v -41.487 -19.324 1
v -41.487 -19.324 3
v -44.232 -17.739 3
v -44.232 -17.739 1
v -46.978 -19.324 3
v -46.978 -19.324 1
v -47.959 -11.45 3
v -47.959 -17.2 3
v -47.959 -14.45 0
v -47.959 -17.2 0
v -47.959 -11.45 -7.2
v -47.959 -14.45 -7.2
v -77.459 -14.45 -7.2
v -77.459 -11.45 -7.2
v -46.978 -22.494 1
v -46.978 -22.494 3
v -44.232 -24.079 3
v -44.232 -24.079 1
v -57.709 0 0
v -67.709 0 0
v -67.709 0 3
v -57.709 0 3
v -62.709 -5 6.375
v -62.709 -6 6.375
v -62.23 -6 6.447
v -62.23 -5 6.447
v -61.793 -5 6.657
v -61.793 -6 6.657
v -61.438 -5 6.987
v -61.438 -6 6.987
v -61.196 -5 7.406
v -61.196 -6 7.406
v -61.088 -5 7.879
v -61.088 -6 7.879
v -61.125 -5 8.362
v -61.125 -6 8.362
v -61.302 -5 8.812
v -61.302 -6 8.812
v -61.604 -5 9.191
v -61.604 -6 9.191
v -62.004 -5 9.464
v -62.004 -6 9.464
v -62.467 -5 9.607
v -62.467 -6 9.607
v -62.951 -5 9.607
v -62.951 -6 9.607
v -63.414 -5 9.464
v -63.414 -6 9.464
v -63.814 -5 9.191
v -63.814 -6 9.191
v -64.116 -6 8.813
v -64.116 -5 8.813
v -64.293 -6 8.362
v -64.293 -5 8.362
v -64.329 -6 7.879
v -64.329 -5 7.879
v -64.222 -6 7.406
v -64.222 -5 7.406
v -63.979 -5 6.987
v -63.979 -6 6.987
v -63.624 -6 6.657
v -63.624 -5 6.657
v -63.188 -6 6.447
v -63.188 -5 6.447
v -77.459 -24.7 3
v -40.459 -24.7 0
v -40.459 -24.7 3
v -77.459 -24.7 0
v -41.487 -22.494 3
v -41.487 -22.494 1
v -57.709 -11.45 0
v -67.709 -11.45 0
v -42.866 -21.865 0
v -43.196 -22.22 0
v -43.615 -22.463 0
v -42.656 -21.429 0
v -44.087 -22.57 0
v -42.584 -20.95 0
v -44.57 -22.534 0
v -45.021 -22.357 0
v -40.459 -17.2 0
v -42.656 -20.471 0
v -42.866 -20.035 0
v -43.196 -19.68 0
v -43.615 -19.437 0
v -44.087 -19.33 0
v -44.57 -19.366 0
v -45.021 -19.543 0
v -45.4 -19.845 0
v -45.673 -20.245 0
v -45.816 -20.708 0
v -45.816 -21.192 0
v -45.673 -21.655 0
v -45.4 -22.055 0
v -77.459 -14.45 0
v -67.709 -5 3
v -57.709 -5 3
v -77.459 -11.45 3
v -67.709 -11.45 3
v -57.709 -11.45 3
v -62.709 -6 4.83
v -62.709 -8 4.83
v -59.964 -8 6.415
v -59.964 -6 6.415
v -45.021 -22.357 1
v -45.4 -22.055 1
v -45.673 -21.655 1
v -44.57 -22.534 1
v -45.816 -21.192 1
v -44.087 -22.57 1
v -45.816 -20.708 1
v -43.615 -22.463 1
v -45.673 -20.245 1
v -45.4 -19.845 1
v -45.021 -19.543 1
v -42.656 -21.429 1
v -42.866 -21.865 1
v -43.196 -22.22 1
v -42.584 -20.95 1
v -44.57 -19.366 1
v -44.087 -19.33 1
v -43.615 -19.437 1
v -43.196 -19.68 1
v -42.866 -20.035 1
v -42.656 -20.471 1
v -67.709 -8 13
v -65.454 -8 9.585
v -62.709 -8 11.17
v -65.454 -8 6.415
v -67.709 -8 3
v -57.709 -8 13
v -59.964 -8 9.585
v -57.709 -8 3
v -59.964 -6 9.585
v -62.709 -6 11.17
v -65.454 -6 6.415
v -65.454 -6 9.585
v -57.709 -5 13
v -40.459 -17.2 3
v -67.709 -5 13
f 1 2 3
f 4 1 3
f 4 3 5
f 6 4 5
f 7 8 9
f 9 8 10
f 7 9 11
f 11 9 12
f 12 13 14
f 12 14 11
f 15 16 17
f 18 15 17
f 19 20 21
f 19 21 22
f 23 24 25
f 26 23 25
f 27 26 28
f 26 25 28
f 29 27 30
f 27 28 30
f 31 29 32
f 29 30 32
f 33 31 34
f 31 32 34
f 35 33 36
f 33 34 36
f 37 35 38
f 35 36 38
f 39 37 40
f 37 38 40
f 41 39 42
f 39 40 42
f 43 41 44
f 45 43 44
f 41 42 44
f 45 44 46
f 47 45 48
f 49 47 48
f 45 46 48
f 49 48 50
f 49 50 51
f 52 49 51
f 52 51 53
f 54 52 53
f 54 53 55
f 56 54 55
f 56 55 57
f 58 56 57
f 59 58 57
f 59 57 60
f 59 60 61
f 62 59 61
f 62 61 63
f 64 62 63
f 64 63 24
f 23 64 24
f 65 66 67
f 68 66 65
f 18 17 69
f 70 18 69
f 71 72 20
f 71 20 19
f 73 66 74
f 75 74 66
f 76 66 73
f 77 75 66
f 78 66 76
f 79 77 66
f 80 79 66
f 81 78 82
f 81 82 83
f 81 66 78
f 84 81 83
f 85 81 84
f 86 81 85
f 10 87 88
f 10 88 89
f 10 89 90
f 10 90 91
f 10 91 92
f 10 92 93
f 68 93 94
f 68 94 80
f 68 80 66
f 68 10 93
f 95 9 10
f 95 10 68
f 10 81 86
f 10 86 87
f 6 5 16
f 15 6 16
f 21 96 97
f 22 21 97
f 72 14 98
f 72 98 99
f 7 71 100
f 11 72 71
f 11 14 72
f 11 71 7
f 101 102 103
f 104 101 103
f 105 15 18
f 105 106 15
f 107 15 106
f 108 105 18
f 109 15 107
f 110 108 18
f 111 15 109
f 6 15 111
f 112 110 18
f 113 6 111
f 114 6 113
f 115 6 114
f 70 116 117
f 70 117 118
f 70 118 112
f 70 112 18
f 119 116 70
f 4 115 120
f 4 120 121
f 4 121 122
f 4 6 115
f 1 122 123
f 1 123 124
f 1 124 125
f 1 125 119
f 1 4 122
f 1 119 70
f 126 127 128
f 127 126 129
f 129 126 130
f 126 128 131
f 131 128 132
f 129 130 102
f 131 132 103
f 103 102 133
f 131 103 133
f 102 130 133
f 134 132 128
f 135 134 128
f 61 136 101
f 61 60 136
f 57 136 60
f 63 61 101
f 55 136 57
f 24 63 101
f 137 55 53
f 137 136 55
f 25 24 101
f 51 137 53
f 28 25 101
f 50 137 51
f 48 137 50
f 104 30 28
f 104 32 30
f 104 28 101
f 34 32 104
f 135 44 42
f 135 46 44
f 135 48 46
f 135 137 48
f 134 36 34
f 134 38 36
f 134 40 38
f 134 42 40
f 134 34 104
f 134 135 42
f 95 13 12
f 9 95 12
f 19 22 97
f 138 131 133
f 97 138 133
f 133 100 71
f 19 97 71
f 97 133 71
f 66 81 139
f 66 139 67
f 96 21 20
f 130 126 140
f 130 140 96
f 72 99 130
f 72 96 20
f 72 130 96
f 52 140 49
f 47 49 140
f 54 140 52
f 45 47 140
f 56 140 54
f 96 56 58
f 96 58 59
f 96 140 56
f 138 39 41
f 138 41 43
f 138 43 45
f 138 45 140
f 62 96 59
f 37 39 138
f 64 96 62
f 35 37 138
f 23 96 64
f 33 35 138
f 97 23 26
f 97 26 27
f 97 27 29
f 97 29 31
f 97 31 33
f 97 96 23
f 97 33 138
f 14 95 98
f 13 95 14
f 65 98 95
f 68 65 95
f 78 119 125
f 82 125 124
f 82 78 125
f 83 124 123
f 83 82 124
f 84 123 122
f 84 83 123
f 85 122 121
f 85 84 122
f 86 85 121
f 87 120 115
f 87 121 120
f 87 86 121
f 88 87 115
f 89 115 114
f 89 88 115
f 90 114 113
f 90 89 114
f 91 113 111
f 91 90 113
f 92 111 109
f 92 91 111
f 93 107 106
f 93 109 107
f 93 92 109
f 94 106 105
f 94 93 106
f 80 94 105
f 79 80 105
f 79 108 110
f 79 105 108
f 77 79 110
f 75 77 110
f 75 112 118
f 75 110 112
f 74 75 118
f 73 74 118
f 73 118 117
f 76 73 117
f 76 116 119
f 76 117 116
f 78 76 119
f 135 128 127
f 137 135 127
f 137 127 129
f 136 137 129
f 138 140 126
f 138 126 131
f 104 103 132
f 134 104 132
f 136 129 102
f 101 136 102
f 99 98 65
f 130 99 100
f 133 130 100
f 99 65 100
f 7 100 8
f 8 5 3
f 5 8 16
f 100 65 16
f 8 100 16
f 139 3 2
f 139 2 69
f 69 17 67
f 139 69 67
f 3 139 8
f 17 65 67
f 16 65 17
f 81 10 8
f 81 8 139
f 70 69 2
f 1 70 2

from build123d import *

# Parameters (mm, degrees)
CROQUIS1_R              = 1.625
SALIENTE_EXTRUIR1_DEPTH = 3
CORTAR_EXTRUIR1_DEPTH   = 2
CROQUIS4_W              = 29.5
CROQUIS4_H              = 10.2
SALIENTE_EXTRUIR2_DEPTH = 3
SALIENTE_EXTRUIR3_DEPTH = 3
CROQUIS7_W              = 10
CROQUIS7_H              = 3
SALIENTE_EXTRUIR4_DEPTH = 5
CROQUIS9_W              = 10
CROQUIS9_H              = 3
SALIENTE_EXTRUIR5_DEPTH = 10
CROQUIS10_R             = 1.625
CORTAR_EXTRUIR2_DEPTH   = 3
CORTAR_EXTRUIR3_DEPTH   = 2


with BuildPart() as part:
    # Croquis1 → Saliente-Extruir1 (new body)
    with BuildSketch(Plane.XY):
        Polygon((-40.458841365, -24.7), (-77.458841365, -24.7), (-77.458841365, -14.45), (-47.958841365, -14.45), (-47.958841365, -17.2), (-40.458841365, -17.2), align=None)
        with Locations((-44.208841365, -20.95)):
            Circle(CROQUIS1_R, mode=Mode.SUBTRACT)
    extrude(amount=SALIENTE_EXTRUIR1_DEPTH)

    # Croquis2 → Cortar-Extruir1 (cut)
    with BuildSketch(Plane.XY.offset(3)):
        Polygon((-44.232492922, -17.739034302), (-46.977793452, -19.324034302), (-46.977793452, -22.494034302), (-44.232492922, -24.079034302), (-41.487192392, -22.494034302), (-41.487192392, -19.324034302), align=None)
    extrude(amount=-CORTAR_EXTRUIR1_DEPTH, mode=Mode.SUBTRACT)

    # Croquis4 → Saliente-Extruir2 (add)
    with BuildSketch(Plane(origin=(0, -14.45, 0), x_dir=(1, 0, 0), z_dir=(0, 1, 0))):
        with Locations((-62.708841365, 2.1)):
            Rectangle(CROQUIS4_W, CROQUIS4_H)
    extrude(amount=SALIENTE_EXTRUIR2_DEPTH)

    # Croquis6 → Saliente-Extruir3 (add)
    with BuildSketch(Plane.XY.offset(3)):
        Polygon((-62.708841365, -11.45), (-67.708841365, -11.45), (-67.708841365, -5), (-57.708841365, -5), (-57.708841365, -11.45), align=None)
    extrude(amount=-SALIENTE_EXTRUIR3_DEPTH)

    # Croquis7 → Saliente-Extruir4 (add)
    with BuildSketch(Plane(origin=(0, -5, 0), x_dir=(1, 0, 0), z_dir=(0, 1, 0))):
        with Locations((-62.708841365, -1.5)):
            Rectangle(CROQUIS7_W, CROQUIS7_H)
    extrude(amount=SALIENTE_EXTRUIR4_DEPTH)

    # Croquis9 → Saliente-Extruir5 (add)
    with BuildSketch(Plane.XY.offset(3)):
        with Locations((-62.708841365, -6.5)):
            Rectangle(CROQUIS9_W, CROQUIS9_H)
    extrude(amount=SALIENTE_EXTRUIR5_DEPTH)

    # Croquis10 → Cortar-Extruir2 (cut)
    with BuildSketch(Plane.XZ.offset(8)):
        with Locations(Location((-62.708841365, 8, 0), (0, 0, 270))):
            Circle(CROQUIS10_R)
    extrude(amount=-CORTAR_EXTRUIR2_DEPTH, mode=Mode.SUBTRACT)

    # Croquis11 → Cortar-Extruir3 (cut)
    with BuildSketch(Plane.XZ.offset(8)):
        Polygon((-62.708841365, 4.83), (-59.963540835, 6.415), (-59.963540835, 9.585), (-62.708841365, 11.17), (-65.454141895, 9.585), (-65.454141895, 6.415), align=None)
    extrude(amount=-CORTAR_EXTRUIR3_DEPTH, mode=Mode.SUBTRACT)


solid = part.part
